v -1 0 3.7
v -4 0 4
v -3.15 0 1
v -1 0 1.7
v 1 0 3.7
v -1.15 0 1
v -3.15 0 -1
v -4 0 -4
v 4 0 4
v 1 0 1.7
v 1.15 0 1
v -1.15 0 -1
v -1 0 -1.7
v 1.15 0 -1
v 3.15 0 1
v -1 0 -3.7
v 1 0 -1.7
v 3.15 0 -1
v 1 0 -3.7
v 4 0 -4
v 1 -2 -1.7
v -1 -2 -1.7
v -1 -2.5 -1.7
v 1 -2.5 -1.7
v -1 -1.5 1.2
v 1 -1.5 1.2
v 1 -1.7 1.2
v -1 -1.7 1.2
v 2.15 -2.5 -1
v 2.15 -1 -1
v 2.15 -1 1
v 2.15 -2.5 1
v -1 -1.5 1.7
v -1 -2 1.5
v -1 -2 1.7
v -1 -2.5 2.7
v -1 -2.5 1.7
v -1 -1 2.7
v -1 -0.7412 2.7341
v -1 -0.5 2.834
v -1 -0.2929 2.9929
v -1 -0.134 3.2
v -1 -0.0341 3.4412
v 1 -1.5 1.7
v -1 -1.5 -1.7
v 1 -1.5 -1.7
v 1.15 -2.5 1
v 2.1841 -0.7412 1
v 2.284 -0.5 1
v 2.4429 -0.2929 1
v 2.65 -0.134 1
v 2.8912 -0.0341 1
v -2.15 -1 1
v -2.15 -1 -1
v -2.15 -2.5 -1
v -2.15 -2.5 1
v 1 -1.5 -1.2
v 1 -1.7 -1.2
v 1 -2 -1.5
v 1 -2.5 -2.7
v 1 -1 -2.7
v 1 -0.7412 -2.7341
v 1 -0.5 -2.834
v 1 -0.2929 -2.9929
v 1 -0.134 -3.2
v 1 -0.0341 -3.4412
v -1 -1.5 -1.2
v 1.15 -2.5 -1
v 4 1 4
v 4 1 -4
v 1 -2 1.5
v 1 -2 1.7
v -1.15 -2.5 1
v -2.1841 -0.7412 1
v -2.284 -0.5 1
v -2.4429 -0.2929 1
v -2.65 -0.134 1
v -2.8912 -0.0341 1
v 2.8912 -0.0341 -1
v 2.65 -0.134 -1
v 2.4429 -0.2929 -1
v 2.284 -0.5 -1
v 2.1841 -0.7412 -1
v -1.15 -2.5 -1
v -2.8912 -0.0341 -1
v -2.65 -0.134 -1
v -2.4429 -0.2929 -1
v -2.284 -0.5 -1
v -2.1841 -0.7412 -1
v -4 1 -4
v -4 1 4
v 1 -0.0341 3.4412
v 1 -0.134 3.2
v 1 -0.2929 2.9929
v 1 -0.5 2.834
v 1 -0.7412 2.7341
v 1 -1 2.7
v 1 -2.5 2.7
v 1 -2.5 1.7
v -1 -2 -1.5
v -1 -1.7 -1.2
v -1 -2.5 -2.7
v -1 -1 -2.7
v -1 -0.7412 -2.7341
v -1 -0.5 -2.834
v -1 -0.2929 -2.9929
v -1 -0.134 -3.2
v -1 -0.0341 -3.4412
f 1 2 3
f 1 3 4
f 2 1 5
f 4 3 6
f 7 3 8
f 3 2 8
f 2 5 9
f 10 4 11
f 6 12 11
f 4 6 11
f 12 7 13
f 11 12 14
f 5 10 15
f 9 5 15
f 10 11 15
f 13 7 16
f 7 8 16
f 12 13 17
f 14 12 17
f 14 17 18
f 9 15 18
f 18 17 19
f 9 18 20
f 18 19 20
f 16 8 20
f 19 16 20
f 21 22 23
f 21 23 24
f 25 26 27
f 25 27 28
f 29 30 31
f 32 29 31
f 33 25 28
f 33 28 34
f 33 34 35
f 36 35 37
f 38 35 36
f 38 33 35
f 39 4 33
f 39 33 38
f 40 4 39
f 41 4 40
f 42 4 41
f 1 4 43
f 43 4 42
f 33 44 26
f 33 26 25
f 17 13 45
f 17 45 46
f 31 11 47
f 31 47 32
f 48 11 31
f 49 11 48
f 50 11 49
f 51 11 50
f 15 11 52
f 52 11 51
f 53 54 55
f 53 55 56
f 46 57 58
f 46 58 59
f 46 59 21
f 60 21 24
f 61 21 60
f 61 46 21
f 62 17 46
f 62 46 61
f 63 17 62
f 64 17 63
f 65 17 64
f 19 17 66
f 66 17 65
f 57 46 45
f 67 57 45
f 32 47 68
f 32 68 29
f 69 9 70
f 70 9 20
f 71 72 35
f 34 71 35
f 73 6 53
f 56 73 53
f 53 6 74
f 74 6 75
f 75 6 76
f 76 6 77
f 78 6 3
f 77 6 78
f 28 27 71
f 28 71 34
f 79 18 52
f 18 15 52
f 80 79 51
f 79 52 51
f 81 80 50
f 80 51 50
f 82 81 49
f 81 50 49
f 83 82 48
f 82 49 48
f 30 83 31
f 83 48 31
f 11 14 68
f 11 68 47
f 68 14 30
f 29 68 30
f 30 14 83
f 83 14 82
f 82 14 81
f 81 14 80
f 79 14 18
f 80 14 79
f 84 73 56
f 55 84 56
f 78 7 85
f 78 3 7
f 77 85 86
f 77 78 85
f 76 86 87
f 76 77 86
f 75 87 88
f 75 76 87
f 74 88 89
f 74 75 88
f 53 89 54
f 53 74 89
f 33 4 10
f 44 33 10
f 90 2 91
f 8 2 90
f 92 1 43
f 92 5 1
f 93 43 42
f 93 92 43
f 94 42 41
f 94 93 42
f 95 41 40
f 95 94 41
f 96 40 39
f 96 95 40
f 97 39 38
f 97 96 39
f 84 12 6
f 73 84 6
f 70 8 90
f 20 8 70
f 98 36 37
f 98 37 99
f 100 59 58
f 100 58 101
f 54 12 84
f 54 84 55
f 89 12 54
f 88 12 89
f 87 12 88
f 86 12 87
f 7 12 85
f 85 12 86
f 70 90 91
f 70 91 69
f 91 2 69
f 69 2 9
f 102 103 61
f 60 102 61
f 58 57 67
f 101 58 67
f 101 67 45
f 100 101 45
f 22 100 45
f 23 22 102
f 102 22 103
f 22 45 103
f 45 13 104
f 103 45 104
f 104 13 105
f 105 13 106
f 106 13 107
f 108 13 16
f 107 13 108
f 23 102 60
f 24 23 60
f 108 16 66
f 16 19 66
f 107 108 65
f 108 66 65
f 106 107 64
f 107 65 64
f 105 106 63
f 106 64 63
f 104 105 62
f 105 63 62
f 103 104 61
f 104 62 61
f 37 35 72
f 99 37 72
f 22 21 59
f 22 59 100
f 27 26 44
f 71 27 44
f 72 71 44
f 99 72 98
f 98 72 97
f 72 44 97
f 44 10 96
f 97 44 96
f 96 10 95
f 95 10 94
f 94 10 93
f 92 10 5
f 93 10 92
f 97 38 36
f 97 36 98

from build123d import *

# Parameters (mm, degrees)
SKETCH1_W                = 8
SKETCH1_H                = 8
BOSS_EXTRUDE1_DEPTH      = 1
SKETCH2_W                = 2
SKETCH2_H                = 1
SKETCH2_W_2              = 1
SKETCH2_H_2              = 2
BOSS_EXTRUDE2_DEPTH      = 2.5
SKETCH3_W                = 2
SKETCH3_H                = 0.5
BOSS_EXTRUDE3_DEPTH      = 0.5
CHAMFER2_SIZE            = 0.3
CHAMFER2_OF_MIRROR2_SIZE = 0.3
FILLET1_R                = 1


with BuildPart() as part:
    # Sketch1 → Boss-Extrude1 (new body)
    with BuildSketch(Plane(origin=(0, 0, 0), x_dir=(1, 0, 0), z_dir=(0, 1, 0))):
        Rectangle(SKETCH1_W, SKETCH1_H)
    extrude(amount=BOSS_EXTRUDE1_DEPTH)

    # Sketch2 → Boss-Extrude2 (add)
    with BuildSketch(Plane.XZ):
        with Locations((0, 2.2)):
            Rectangle(SKETCH2_W, SKETCH2_H)
        with Locations((1.65, 0)):
            Rectangle(SKETCH2_W_2, SKETCH2_H_2)
    boss_extrude2 = extrude(amount=BOSS_EXTRUDE2_DEPTH)

    # Sketch3 → Boss-Extrude3 (add)
    with BuildSketch(Plane(origin=(0, 0, 1.7), x_dir=(-1, 0, 0), z_dir=(0, 0, -1))):
        with Locations((0, -1.75)):
            Rectangle(SKETCH3_W, SKETCH3_H)
    boss_extrude3 = extrude(amount=BOSS_EXTRUDE3_DEPTH)

    # Chamfer2
    chamfer2_edges = [part.edges().sort_by_distance(p)[0] for p in [
        (0, -2, 1.2),
    ]]
    chamfer(chamfer2_edges, length=CHAMFER2_SIZE)

    # Mirror1: Boss-Extrude2 across plane
    add(boss_extrude2.mirror(Plane(origin=(0, 0, 0), x_dir=(0, 0, 1), z_dir=(1, 0, 0))))

    # Mirror2: Boss-Extrude2, Boss-Extrude3 across plane
    add(boss_extrude2.mirror(Plane.XY))
    add(boss_extrude3.mirror(Plane.XY))

    # Chamfer2 of Mirror2
    chamfer2_of_mirror2_edges = [part.edges().sort_by_distance(p)[0] for p in [
        (0, -2, -1.2),
    ]]
    chamfer(chamfer2_of_mirror2_edges, length=CHAMFER2_OF_MIRROR2_SIZE)

    # Fillet1
    fillet1_edges = [part.edges().sort_by_distance(p)[0] for p in [
        (0, 0, 2.7),
        (2.15, 0, 0),
        (-2.15, 0, 0),
        (0, 0, -2.7),
    ]]
    fillet(fillet1_edges, radius=FILLET1_R)


solid = part.part
